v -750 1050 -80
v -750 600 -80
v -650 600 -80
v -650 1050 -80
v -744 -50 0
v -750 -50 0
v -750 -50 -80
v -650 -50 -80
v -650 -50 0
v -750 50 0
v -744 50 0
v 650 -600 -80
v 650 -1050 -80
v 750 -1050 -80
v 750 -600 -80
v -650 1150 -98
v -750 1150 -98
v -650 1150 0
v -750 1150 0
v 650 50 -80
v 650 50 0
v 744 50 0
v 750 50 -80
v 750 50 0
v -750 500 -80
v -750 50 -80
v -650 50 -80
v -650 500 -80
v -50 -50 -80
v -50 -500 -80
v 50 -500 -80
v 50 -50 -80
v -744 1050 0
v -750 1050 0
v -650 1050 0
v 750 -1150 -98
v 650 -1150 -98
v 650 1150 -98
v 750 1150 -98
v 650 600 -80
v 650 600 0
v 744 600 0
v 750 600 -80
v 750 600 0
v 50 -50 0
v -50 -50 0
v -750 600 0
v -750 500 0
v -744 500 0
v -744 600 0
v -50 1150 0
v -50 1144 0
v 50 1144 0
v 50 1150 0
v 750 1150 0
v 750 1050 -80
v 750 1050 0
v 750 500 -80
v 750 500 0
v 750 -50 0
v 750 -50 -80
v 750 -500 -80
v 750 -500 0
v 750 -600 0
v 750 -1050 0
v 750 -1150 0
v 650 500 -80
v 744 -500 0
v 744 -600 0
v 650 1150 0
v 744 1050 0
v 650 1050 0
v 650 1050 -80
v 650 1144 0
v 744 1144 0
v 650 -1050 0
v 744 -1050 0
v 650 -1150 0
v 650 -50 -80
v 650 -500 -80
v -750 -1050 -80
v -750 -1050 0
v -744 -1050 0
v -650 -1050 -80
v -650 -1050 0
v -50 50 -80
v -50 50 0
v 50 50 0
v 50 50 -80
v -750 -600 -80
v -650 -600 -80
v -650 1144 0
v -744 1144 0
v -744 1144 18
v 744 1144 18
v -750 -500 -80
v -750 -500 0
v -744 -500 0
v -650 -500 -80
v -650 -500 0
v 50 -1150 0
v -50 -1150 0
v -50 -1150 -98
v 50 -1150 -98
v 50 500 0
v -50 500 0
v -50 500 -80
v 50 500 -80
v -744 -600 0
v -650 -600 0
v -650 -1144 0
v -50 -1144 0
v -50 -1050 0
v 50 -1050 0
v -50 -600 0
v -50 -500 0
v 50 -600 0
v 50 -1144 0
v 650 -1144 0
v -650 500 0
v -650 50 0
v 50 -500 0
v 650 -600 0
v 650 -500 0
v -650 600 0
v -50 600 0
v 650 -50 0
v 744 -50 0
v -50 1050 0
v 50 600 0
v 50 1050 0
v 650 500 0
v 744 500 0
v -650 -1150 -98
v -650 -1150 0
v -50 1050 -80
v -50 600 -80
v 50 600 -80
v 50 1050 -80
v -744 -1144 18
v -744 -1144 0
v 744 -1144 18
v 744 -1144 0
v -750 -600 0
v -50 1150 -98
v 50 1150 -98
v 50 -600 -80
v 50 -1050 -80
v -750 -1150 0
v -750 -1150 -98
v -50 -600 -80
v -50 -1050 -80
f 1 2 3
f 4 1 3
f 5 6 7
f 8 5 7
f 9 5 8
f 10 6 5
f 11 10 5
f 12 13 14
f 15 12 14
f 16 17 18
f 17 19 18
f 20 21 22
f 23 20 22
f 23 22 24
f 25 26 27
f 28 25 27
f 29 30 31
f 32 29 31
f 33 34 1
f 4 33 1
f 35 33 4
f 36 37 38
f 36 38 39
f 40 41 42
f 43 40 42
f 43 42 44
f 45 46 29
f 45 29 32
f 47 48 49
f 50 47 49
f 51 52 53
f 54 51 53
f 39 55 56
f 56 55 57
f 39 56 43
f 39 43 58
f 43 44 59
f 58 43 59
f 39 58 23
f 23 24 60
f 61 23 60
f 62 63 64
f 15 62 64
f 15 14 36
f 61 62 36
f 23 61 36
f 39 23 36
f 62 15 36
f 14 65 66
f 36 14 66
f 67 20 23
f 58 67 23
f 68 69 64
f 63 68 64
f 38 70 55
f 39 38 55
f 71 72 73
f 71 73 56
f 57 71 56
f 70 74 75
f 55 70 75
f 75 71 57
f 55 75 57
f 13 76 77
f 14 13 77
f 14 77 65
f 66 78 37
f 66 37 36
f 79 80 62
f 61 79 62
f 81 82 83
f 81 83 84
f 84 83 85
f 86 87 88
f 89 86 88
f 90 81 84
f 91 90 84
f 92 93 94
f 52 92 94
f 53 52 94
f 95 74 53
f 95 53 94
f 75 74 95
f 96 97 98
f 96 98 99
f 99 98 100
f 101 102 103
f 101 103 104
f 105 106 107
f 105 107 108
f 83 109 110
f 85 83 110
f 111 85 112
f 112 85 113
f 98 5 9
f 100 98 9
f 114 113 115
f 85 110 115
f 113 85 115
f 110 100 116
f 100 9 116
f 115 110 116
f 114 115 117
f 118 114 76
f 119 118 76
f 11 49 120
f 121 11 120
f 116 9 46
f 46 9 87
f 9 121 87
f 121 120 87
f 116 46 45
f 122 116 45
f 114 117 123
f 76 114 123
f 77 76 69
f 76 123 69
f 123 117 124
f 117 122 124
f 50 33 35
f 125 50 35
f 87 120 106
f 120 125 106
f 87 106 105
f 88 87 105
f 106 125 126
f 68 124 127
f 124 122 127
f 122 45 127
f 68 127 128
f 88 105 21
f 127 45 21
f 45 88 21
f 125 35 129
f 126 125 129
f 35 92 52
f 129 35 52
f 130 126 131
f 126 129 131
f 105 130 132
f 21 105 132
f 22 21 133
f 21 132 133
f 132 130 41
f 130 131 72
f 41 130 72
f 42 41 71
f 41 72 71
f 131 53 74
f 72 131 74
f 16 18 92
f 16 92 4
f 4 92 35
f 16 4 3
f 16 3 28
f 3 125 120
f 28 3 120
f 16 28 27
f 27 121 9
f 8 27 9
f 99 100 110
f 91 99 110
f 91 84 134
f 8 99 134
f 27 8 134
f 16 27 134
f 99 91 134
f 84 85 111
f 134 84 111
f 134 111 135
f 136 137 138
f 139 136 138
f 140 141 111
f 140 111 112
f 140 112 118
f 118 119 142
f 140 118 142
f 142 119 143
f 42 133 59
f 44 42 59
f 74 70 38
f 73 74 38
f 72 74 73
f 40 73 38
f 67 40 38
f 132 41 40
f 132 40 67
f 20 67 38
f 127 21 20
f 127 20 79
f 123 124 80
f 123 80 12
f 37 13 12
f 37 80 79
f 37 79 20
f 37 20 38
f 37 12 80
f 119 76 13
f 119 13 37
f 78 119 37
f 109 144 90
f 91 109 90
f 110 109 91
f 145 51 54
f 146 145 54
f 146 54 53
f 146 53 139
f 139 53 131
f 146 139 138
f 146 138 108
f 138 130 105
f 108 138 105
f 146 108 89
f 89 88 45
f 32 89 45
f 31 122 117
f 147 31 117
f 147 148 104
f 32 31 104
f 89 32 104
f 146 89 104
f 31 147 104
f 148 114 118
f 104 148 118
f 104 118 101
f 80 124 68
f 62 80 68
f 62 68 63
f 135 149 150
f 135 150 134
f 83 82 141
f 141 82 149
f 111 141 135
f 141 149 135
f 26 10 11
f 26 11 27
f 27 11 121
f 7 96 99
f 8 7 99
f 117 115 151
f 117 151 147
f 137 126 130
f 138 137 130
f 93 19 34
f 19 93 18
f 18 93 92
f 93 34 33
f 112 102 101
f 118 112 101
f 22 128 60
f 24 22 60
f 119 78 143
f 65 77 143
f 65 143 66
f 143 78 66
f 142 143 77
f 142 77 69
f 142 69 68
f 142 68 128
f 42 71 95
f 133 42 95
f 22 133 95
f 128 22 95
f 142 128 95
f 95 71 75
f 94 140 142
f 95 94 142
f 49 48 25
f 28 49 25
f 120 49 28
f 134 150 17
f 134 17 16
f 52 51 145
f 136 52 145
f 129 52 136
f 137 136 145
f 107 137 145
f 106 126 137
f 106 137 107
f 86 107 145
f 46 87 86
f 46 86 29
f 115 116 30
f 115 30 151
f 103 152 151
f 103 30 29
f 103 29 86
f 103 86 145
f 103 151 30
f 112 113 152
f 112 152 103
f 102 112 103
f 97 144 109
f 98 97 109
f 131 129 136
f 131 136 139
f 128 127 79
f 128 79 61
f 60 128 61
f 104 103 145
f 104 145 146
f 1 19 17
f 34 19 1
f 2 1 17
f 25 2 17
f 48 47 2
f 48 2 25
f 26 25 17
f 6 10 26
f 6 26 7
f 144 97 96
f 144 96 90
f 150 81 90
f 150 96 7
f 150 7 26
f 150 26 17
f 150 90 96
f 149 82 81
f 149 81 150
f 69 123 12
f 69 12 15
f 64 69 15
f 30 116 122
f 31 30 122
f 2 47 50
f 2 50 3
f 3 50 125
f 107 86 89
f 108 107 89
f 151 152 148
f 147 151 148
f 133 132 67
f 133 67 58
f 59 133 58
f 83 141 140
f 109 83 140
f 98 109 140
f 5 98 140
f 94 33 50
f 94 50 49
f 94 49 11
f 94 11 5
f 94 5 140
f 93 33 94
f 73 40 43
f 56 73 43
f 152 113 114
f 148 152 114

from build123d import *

# Parameters (mm, degrees)
F0_W     = 1488
F0_H     = 2288
F1_DEPTH = 18
F2_W     = 100
F2_H     = 100
F3_DEPTH = 80
F4_W     = 100
F4_H     = 2300
F5_DEPTH = 18


with BuildPart() as f1:
    # F0 (on Top) → F1 (new body)
    with BuildSketch(Plane.XY):
        Rectangle(F0_W, F0_H)
    extrude(amount=F1_DEPTH)

    # F2 (on face) → F3 (join)
    with BuildSketch(Plane(origin=(0, 0, 0), x_dir=(1, 0, 0), z_dir=(0, 0, -1))):
        with Locations((-700, 1100)):
            Rectangle(F2_W, F2_H)
        with Locations((-700, 550)):
            Rectangle(F2_W, F2_H)
        with Locations((-700, 0)):
            Rectangle(F2_W, F2_H)
        with Locations((-700, -550)):
            Rectangle(F2_W, F2_H)
        with Locations((-700, -1100)):
            Rectangle(F2_W, F2_H)
        with Locations((0, 1100)):
            Rectangle(F2_W, F2_H)
        with Locations((0, 550)):
            Rectangle(F2_W, F2_H)
        Rectangle(F2_W, F2_H)
        with Locations((0, -550)):
            Rectangle(F2_W, F2_H)
        with Locations((0, -1100)):
            Rectangle(F2_W, F2_H)
        with Locations((700, 1100)):
            Rectangle(F2_W, F2_H)
        with Locations((700, 550)):
            Rectangle(F2_W, F2_H)
        with Locations((700, 0)):
            Rectangle(F2_W, F2_H)
        with Locations((700, -550)):
            Rectangle(F2_W, F2_H)
        with Locations((700, -1100)):
            Rectangle(F2_W, F2_H)
    extrude(amount=F3_DEPTH)

    # F4 (on face) → F5 (join)
    with BuildSketch(Plane(origin=(0, 0, -80), x_dir=(1, 0, 0), z_dir=(0, 0, -1))):
        with Locations((-700, 0)):
            Rectangle(F4_W, F4_H)
        Rectangle(F4_W, F4_H)
        with Locations((700, 0)):
            Rectangle(F4_W, F4_H)
    extrude(amount=F5_DEPTH)


solid = f1.part
